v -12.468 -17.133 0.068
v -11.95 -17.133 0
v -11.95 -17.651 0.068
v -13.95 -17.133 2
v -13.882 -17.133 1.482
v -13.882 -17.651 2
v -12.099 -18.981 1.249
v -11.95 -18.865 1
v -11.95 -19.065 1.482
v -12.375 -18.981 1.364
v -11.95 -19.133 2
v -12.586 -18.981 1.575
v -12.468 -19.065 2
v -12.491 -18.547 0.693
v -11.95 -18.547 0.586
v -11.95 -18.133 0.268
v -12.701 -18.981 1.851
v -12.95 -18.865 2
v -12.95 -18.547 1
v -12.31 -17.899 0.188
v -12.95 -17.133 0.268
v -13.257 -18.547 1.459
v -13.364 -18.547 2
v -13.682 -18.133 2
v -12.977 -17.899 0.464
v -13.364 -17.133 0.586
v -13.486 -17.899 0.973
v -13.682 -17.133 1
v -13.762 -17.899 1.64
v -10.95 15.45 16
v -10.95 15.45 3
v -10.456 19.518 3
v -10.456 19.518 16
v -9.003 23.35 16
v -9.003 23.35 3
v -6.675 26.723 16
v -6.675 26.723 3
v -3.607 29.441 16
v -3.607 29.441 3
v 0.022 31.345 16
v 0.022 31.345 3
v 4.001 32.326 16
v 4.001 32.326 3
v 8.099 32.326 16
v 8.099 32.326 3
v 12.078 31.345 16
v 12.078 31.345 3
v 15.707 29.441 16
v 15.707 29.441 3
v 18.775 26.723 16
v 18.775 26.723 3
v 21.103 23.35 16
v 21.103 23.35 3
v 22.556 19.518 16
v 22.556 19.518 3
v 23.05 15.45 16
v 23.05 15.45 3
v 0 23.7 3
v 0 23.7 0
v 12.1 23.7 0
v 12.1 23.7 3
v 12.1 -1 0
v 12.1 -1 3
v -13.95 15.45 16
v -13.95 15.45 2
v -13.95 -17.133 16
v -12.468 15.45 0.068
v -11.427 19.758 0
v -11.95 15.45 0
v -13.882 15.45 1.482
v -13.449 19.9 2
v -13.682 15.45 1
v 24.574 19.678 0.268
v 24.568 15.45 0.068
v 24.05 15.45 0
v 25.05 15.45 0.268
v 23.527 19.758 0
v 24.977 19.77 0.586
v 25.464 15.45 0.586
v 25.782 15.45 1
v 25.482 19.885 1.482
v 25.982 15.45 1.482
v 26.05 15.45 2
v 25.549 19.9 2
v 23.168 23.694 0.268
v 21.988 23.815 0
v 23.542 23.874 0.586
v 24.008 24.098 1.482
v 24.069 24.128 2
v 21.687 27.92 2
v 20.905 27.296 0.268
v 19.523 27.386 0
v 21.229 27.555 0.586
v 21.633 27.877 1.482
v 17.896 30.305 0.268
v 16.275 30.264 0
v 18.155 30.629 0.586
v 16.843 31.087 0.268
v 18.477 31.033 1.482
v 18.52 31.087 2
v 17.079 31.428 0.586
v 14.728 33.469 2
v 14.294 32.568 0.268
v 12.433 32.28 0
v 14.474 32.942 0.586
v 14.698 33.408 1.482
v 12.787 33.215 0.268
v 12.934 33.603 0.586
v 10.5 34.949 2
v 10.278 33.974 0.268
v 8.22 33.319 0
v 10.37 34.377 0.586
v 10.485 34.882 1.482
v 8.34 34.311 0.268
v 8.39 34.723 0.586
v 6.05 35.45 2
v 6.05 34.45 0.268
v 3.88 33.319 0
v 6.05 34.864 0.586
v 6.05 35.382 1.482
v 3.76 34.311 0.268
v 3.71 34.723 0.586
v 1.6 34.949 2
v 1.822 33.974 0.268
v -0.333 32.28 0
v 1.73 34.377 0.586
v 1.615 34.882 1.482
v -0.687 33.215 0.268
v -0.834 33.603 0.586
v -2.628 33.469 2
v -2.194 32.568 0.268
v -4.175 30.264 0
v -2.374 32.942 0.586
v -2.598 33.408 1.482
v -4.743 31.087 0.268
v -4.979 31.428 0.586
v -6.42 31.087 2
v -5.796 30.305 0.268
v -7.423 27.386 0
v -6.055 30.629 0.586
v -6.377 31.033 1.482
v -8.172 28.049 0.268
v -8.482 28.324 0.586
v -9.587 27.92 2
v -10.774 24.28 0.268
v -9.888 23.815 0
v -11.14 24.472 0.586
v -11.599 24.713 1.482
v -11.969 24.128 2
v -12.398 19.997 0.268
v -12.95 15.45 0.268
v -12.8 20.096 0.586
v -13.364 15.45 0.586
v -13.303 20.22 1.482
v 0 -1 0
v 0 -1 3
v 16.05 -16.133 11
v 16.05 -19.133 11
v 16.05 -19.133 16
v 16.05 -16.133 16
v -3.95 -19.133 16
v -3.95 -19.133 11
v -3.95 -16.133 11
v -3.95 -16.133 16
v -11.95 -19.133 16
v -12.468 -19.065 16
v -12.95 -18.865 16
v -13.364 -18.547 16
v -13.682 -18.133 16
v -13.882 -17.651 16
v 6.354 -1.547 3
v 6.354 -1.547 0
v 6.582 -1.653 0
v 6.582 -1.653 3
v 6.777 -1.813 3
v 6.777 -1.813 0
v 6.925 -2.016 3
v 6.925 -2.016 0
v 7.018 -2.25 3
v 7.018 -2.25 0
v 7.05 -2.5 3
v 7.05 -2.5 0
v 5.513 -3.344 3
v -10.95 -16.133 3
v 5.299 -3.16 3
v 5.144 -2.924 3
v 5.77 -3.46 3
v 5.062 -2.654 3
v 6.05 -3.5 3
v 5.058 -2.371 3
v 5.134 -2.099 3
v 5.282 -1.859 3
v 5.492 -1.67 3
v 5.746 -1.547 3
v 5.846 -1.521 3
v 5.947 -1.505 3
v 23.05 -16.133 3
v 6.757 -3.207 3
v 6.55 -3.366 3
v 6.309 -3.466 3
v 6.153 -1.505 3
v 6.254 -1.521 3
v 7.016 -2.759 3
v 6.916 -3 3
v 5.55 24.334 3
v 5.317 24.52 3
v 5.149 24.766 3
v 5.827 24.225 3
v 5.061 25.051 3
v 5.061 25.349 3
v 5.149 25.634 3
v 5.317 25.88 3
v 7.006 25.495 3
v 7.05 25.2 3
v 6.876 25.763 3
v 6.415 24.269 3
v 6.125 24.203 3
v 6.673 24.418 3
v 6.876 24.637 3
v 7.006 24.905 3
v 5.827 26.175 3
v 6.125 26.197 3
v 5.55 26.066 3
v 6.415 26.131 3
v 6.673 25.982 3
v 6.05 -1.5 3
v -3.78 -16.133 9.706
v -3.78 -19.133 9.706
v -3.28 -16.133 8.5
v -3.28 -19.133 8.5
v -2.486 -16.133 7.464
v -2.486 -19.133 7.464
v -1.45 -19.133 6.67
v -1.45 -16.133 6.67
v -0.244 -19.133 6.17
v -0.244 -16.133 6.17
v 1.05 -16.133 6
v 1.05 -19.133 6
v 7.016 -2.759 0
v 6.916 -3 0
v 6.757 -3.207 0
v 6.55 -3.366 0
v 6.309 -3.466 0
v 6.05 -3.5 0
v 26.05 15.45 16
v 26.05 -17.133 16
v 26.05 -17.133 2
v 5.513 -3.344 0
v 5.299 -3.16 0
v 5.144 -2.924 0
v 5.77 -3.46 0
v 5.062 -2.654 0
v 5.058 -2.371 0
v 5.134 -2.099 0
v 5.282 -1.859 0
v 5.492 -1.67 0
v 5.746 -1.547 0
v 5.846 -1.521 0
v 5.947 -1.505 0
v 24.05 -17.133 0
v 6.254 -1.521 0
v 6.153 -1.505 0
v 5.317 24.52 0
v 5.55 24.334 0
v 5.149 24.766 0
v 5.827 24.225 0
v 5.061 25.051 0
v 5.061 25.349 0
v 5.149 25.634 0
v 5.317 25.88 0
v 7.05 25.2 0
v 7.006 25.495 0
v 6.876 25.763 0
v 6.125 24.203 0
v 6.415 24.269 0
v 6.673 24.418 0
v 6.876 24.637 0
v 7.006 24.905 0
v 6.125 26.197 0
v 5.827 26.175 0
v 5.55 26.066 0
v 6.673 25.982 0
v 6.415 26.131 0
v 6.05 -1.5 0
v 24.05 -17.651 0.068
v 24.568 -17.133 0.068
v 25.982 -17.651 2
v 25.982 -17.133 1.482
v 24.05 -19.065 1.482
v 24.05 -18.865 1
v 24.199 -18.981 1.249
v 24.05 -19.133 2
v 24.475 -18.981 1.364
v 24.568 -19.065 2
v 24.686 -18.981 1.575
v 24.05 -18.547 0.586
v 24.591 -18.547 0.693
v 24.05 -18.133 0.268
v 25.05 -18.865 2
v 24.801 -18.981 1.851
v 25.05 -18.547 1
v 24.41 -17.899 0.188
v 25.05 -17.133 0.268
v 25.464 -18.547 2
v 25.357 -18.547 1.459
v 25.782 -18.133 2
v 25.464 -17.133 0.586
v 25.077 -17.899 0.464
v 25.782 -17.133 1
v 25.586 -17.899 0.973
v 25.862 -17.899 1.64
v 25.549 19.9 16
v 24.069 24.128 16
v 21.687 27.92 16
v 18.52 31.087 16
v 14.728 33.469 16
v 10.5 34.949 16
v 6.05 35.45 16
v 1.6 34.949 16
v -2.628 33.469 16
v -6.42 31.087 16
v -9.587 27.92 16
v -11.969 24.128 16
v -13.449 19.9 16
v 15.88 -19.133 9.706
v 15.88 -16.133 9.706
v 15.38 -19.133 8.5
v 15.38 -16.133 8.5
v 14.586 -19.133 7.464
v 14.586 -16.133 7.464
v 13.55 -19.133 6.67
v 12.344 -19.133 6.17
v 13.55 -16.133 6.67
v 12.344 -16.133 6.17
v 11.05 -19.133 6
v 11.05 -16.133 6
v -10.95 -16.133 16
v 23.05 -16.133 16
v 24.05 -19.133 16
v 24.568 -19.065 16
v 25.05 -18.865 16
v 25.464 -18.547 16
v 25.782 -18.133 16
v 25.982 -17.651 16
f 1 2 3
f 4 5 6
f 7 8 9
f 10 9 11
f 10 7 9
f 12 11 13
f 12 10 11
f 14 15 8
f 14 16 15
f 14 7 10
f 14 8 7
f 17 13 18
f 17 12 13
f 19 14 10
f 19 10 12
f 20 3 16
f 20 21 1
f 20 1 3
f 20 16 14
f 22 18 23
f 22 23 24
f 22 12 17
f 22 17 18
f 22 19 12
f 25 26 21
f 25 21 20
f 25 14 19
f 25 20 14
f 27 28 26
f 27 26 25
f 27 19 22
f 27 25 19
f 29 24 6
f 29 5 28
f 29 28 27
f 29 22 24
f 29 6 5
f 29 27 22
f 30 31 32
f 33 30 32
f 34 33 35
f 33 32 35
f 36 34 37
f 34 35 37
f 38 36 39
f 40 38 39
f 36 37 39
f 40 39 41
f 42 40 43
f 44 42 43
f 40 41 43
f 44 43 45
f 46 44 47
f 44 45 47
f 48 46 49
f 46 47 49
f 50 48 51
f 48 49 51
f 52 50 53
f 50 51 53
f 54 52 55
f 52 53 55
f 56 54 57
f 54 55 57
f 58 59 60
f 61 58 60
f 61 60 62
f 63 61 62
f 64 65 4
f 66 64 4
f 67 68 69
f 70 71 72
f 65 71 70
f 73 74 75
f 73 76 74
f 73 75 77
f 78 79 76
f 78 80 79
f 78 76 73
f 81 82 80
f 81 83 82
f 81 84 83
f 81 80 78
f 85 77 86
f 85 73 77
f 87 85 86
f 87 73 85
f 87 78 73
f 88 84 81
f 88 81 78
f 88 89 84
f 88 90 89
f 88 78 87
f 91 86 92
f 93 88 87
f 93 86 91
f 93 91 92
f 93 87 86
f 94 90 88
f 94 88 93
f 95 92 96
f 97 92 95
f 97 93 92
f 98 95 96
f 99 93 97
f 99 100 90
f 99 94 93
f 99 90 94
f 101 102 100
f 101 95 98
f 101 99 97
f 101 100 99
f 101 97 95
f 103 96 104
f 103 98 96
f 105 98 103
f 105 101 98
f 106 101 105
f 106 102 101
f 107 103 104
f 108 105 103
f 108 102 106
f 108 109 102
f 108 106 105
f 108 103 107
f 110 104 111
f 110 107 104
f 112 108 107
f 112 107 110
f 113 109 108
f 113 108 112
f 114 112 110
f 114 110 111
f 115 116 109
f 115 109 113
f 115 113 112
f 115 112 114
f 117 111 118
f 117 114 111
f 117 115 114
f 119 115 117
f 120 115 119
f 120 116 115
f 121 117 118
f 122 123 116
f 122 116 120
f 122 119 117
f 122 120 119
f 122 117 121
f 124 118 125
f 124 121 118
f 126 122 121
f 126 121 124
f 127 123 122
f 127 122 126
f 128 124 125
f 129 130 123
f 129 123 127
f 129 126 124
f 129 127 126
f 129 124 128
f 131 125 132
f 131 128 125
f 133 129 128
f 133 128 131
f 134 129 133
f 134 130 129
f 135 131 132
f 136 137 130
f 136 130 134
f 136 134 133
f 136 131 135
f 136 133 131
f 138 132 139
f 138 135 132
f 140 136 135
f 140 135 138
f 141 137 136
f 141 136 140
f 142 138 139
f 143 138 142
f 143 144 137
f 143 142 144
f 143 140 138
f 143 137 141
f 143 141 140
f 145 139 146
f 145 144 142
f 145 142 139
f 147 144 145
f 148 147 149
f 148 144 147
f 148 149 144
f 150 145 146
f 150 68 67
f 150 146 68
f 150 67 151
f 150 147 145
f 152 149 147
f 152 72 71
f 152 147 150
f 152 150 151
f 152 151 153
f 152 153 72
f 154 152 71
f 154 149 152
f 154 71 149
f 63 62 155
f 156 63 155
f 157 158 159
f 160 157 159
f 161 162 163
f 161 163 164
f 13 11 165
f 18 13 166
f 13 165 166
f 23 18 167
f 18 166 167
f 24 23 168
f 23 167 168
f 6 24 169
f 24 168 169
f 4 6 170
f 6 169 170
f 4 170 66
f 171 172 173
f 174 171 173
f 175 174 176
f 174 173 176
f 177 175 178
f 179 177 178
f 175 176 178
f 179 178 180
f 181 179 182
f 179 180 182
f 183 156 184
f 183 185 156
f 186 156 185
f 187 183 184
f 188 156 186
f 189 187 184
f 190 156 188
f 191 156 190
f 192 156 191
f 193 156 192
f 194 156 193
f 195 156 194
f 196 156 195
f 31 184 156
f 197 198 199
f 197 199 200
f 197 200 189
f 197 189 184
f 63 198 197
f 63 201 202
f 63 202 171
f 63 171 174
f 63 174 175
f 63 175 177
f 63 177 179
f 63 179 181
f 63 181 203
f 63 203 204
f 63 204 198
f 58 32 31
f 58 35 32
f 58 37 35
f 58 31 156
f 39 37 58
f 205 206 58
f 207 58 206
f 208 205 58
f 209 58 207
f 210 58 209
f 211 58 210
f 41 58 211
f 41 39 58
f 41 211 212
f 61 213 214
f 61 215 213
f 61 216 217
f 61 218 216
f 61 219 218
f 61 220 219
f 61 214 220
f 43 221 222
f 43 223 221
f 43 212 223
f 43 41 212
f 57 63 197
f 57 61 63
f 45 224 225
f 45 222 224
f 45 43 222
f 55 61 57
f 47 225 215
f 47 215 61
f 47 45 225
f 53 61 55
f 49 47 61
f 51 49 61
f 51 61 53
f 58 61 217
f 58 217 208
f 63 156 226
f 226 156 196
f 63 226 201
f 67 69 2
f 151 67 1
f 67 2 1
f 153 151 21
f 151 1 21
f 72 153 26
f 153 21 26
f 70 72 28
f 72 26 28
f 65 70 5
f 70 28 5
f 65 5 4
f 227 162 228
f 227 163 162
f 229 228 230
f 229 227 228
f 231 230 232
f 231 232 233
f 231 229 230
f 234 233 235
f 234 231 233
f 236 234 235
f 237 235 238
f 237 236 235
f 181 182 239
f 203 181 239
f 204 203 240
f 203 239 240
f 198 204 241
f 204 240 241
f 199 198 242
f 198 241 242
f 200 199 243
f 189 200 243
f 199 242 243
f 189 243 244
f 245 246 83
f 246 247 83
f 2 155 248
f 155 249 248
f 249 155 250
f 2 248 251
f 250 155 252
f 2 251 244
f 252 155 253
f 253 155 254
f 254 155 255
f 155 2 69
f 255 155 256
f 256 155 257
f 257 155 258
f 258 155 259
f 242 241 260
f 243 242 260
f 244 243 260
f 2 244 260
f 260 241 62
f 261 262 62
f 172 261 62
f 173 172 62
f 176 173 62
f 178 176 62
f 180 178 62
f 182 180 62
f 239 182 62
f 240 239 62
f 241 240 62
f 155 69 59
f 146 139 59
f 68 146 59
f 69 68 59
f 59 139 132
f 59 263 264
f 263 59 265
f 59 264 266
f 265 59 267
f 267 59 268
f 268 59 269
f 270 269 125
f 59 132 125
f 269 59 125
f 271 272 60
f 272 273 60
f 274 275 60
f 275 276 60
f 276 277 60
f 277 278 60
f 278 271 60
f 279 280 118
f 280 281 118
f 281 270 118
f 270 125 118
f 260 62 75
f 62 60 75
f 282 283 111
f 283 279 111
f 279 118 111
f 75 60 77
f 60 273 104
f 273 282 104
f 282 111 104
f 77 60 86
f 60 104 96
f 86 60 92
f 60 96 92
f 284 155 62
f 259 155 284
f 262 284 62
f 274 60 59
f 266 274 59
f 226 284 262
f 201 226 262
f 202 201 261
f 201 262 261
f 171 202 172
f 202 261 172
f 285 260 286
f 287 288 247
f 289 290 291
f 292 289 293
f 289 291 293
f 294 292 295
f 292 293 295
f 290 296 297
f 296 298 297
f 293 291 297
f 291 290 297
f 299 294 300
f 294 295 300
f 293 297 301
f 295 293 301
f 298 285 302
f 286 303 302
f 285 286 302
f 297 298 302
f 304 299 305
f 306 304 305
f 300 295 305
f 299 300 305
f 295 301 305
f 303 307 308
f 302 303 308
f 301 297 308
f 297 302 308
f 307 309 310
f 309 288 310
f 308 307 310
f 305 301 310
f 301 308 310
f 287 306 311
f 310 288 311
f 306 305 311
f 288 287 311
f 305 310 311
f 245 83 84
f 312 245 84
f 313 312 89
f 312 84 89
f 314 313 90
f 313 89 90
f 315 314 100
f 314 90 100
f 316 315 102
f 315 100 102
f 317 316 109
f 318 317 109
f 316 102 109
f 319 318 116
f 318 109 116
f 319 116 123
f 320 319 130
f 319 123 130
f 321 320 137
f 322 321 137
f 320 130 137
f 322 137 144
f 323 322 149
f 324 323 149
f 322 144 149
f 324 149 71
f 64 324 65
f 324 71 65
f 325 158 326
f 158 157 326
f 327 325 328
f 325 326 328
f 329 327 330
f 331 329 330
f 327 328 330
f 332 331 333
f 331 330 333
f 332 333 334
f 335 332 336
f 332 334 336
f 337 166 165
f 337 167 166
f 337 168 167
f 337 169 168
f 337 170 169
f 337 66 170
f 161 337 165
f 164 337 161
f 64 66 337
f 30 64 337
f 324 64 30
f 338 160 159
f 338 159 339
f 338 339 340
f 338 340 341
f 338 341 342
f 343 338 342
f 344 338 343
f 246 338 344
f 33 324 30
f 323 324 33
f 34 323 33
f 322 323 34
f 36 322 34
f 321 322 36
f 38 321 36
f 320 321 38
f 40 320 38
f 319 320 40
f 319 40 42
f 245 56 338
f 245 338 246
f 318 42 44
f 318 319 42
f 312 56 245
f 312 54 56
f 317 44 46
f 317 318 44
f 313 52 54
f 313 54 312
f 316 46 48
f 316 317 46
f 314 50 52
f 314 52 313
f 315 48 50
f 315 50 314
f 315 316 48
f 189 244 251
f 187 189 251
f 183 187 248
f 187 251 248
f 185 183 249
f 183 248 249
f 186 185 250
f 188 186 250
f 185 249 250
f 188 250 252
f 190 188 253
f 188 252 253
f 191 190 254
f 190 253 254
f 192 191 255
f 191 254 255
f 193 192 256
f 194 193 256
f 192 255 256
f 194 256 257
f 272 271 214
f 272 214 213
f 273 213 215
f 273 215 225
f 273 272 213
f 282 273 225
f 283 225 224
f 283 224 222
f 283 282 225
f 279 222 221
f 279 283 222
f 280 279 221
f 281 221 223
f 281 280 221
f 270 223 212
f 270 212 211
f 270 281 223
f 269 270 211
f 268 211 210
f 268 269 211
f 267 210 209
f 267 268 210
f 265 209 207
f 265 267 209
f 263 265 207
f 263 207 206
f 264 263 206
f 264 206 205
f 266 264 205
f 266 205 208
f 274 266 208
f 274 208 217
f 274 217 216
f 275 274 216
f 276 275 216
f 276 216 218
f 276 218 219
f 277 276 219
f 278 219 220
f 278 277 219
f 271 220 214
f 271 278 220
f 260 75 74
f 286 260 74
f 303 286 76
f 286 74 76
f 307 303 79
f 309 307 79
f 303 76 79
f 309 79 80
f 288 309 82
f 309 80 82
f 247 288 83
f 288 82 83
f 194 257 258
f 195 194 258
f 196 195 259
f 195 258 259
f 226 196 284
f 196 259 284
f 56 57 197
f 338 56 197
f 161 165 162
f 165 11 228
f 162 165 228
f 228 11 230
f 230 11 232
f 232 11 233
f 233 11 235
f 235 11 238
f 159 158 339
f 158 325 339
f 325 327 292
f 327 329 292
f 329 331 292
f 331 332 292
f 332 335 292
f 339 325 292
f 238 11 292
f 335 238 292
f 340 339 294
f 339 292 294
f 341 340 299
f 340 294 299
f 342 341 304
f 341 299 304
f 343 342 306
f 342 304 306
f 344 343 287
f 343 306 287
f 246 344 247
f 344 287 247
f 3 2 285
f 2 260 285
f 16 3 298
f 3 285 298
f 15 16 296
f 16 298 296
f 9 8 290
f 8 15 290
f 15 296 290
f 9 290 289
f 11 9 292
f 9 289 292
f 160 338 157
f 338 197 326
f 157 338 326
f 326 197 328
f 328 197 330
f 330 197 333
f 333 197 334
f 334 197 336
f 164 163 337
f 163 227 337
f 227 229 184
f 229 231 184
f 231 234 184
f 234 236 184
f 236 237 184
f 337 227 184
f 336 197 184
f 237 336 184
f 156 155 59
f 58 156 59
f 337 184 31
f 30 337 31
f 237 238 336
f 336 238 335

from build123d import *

# Parameters (mm, degrees)
F0_R     = 1
F1_DEPTH = 3
F2_DEPTH = 16
F3_R     = 2
F4_W     = 10
F4_H     = 10
F5_DEPTH = 3
F6_R     = 5


# Not quite as in the source:
# - a feature names something its author has since deleted; it is built from what else it names


with BuildPart() as f1:
    # F0 (on Top) → F1 (new body)
    with BuildSketch(Plane.XY):
        with BuildLine():
            Line((-10.95, 4.9143462471), (-10.95, 15.45))
            ThreePointArc((-10.95, 15.45), (6.05, 32.45), (23.05, 15.45))
            Line((23.05, 15.45), (23.05, 4.9143462471))
            ThreePointArc((23.05, 4.9143462471), (25.2853840617, 9.9727744249), (26.05, 15.45))
            ThreePointArc((26.05, 15.45), (6.05, 35.45), (-13.95, 15.45))
            ThreePointArc((-13.95, 15.45), (-13.1853840617, 9.9727744249), (-10.95, 4.9143462471))
        make_face()
        with BuildLine():
            Line((-10.95, -16.1332358822), (-10.95, 4.9143462471))
            ThreePointArc((-10.95, 4.9143462471), (-13.1853840617, 9.9727744249), (-13.95, 15.45))
            Line((-13.95, 15.45), (-13.95, -19.1332358822))
            Line((-13.95, -19.1332358822), (6.05, -19.1332358822))
            Line((6.05, -19.1332358822), (6.05, -16.1332358822))
            Line((6.05, -16.1332358822), (-10.95, -16.1332358822))
        make_face()
        with BuildLine():
            ThreePointArc((26.05, 15.45), (25.2853840617, 9.9727744249), (23.05, 4.9143462471))
            Line((23.05, 4.9143462471), (23.05, -16.1332358822))
            Line((23.05, -16.1332358822), (6.05, -16.1332358822))
            Line((6.05, -16.1332358822), (6.05, -19.1332358822))
            Line((6.05, -19.1332358822), (26.05, -19.1332358822))
            Line((26.05, -19.1332358822), (26.05, 15.45))
        make_face()
        with BuildLine():
            Line((0, 0), (0, 11.35))
            Line((0, 11.35), (-3, 11.35))
            Line((-3, 11.35), (-3, 1.0591174697))
            ThreePointArc((-3, 1.0591174697), (-1.5369696903, 0.2369171133), (0, -0.4370230062))
            Line((0, -0.4370230062), (0, 0))
        make_face()
        with BuildLine():
            Line((-3, -4.8), (-3, -2.3852880549))
            ThreePointArc((-3, -2.3852880549), (-7.4767065554, 0.7181226667), (-10.95, 4.9143462471))
            Line((-10.95, 4.9143462471), (-10.95, -16.1332358822))
            Line((-10.95, -16.1332358822), (6.05, -16.1332358822))
            Line((6.05, -16.1332358822), (6.05, -4.8))
            Line((6.05, -4.8), (-3, -4.8))
        make_face()
        with BuildLine():
            ThreePointArc((23.05, 4.9143462471), (19.5767065554, 0.7181226667), (15.1, -2.3852880549))
            Line((15.1, -2.3852880549), (15.1, -4.8))
            Line((15.1, -4.8), (6.05, -4.8))
            Line((6.05, -4.8), (6.05, -16.1332358822))
            Line((6.05, -16.1332358822), (23.05, -16.1332358822))
            Line((23.05, -16.1332358822), (23.05, 4.9143462471))
        make_face()
        with BuildLine():
            Line((-3, 1.0591174697), (-3, 11.35))
            Line((-3, 11.35), (-3, 27.5))
            Line((-3, 27.5), (15.1, 27.5))
            Line((15.1, 27.5), (15.1, 1.0591174697))
            ThreePointArc((15.1, 1.0591174697), (20.9303561785, 7.2295985499), (23.05, 15.45))
            ThreePointArc((23.05, 15.45), (6.05, 32.45), (-10.95, 15.45))
            ThreePointArc((-10.95, 15.45), (-8.8303561785, 7.2295985499), (-3, 1.0591174697))
        make_face()
        with BuildLine():
            ThreePointArc((23.05, 15.45), (20.9303561785, 7.2295985499), (15.1, 1.0591174697))
            Line((15.1, 1.0591174697), (15.1, -2.3852880549))
            ThreePointArc((15.1, -2.3852880549), (19.5767065554, 0.7181226667), (23.05, 4.9143462471))
            Line((23.05, 4.9143462471), (23.05, 15.45))
        make_face()
        with BuildLine():
            Line((-3, -2.3852880549), (-3, 1.0591174697))
            ThreePointArc((-3, 1.0591174697), (-8.8303561785, 7.2295985499), (-10.95, 15.45))
            Line((-10.95, 15.45), (-10.95, 4.9143462471))
            ThreePointArc((-10.95, 4.9143462471), (-7.4767065554, 0.7181226667), (-3, -2.3852880549))
        make_face()
        with BuildLine():
            Line((0, -1), (0, -0.4370230062))
            ThreePointArc((0, -0.4370230062), (-1.5369696903, 0.2369171133), (-3, 1.0591174697))
            Line((-3, 1.0591174697), (-3, -2.3852880549))
            ThreePointArc((-3, -2.3852880549), (1.3973535003, -4.0012950867), (6.05, -4.55))
            Line((6.05, -4.55), (6.05, -3.5))
            ThreePointArc((6.05, -3.5), (5.0618917373, -2.6537597518), (5.7461374375, -1.5472841226))
            ThreePointArc((5.7461374375, -1.5472841226), (3.7372080924, -1.3919415031), (1.7607692997, -1))
            Line((1.7607692997, -1), (0, -1))
        make_face()
        with BuildLine():
            ThreePointArc((6.05, -4.55), (1.3973535003, -4.0012950867), (-3, -2.3852880549))
            Line((-3, -2.3852880549), (-3, -4.8))
            Line((-3, -4.8), (6.05, -4.8))
            Line((6.05, -4.8), (6.05, -4.55))
        make_face()
        with BuildLine():
            Line((15.1, -4.8), (15.1, -2.3852880549))
            ThreePointArc((15.1, -2.3852880549), (10.7026464997, -4.0012950867), (6.05, -4.55))
            Line((6.05, -4.55), (6.05, -4.8))
            Line((6.05, -4.8), (15.1, -4.8))
        make_face()
        with BuildLine():
            ThreePointArc((15.1, 1.0591174697), (13.6369696903, 0.2369171133), (12.1, -0.4370230062))
            Line((12.1, -0.4370230062), (12.1, -1))
            Line((12.1, -1), (10.3392307003, -1))
            ThreePointArc((10.3392307003, -1), (8.3627919076, -1.3919415031), (6.3538625625, -1.5472841226))
            ThreePointArc((6.3538625625, -1.5472841226), (6.8574226163, -1.9100265101), (7.05, -2.5))
            ThreePointArc((7.05, -2.5), (6.7571067812, -3.2071067812), (6.05, -3.5))
            Line((6.05, -3.5), (6.05, -4.55))
            ThreePointArc((6.05, -4.55), (10.7026464997, -4.0012950867), (15.1, -2.3852880549))
            Line((15.1, -2.3852880549), (15.1, 1.0591174697))
        make_face()
        with BuildLine():
            Line((10.3392307003, -1), (6.05, -1))
            Line((6.05, -1), (6.05, -1.5))
            ThreePointArc((6.05, -1.5), (6.2037597518, -1.5118917373), (6.3538625625, -1.5472841226))
            ThreePointArc((6.3538625625, -1.5472841226), (8.3627919076, -1.3919415031), (10.3392307003, -1))
        make_face()
        with BuildLine():
            Line((6.05, -1.5), (6.05, -1))
            Line((6.05, -1), (1.7607692997, -1))
            ThreePointArc((1.7607692997, -1), (3.7372080924, -1.3919415031), (5.7461374375, -1.5472841226))
            ThreePointArc((5.7461374375, -1.5472841226), (5.8962402482, -1.5118917373), (6.05, -1.5))
        make_face()
        with BuildLine():
            Line((0, 11.35), (0, 22.7))
            Line((0, 22.7), (0, 23.7))
            Line((0, 23.7), (12.1, 23.7))
            Line((12.1, 23.7), (12.1, 22.7))
            Line((12.1, 22.7), (12.1, 0))
            Line((12.1, 0), (12.1, -0.4370230062))
            ThreePointArc((12.1, -0.4370230062), (13.6369696903, 0.2369171133), (15.1, 1.0591174697))
            Line((15.1, 1.0591174697), (15.1, 27.5))
            Line((15.1, 27.5), (-3, 27.5))
            Line((-3, 27.5), (-3, 11.35))
            Line((-3, 11.35), (0, 11.35))
        make_face()
        with Locations((6.05, 25.2)):
            Circle(F0_R, mode=Mode.SUBTRACT)
    extrude(amount=F1_DEPTH)

    # F0 (on Top) → F2 (join)
    with BuildSketch(Plane.XY):
        with BuildLine():
            Line((-10.95, -16.1332358822), (-10.95, 4.9143462471))
            ThreePointArc((-10.95, 4.9143462471), (-13.1853840617, 9.9727744249), (-13.95, 15.45))
            Line((-13.95, 15.45), (-13.95, -19.1332358822))
            Line((-13.95, -19.1332358822), (6.05, -19.1332358822))
            Line((6.05, -19.1332358822), (6.05, -16.1332358822))
            Line((6.05, -16.1332358822), (-10.95, -16.1332358822))
        make_face()
        with BuildLine():
            ThreePointArc((26.05, 15.45), (25.2853840617, 9.9727744249), (23.05, 4.9143462471))
            Line((23.05, 4.9143462471), (23.05, -16.1332358822))
            Line((23.05, -16.1332358822), (6.05, -16.1332358822))
            Line((6.05, -16.1332358822), (6.05, -19.1332358822))
            Line((6.05, -19.1332358822), (26.05, -19.1332358822))
            Line((26.05, -19.1332358822), (26.05, 15.45))
        make_face()
        with BuildLine():
            Line((-10.95, 4.9143462471), (-10.95, 15.45))
            ThreePointArc((-10.95, 15.45), (6.05, 32.45), (23.05, 15.45))
            Line((23.05, 15.45), (23.05, 4.9143462471))
            ThreePointArc((23.05, 4.9143462471), (25.2853840617, 9.9727744249), (26.05, 15.45))
            ThreePointArc((26.05, 15.45), (6.05, 35.45), (-13.95, 15.45))
            ThreePointArc((-13.95, 15.45), (-13.1853840617, 9.9727744249), (-10.95, 4.9143462471))
        make_face()
    extrude(amount=F2_DEPTH)

    # F3
    f3_edges = [f1.edges().sort_by_distance(p)[0] for p in [
        (26.05, -1.841618, 0),
        (-13.95, -1.841618, 0),
        (6.05, -19.133236, 0),
        (26.05, -19.133236, 8),
        (-13.95, -19.133236, 8),
    ]]
    fillet(f3_edges, radius=F3_R)

    # F4 (on face) → F5 (cut, through all)
    with BuildSketch(Plane.XZ.offset(19.1332358822)):
        with Locations((1.05, 11)):
            Rectangle(F4_W, F4_H)
        with Locations((11.05, 11)):
            Rectangle(F4_W, F4_H)
    extrude(amount=-F5_DEPTH, mode=Mode.SUBTRACT)

    # F6
    f6_edges = [f1.edges().sort_by_distance(p)[0] for p in [
        (-3.95, -17.633236, 6),
        (16.05, -17.633236, 6),
    ]]
    fillet(f6_edges, radius=F6_R)


solid = f1.part
